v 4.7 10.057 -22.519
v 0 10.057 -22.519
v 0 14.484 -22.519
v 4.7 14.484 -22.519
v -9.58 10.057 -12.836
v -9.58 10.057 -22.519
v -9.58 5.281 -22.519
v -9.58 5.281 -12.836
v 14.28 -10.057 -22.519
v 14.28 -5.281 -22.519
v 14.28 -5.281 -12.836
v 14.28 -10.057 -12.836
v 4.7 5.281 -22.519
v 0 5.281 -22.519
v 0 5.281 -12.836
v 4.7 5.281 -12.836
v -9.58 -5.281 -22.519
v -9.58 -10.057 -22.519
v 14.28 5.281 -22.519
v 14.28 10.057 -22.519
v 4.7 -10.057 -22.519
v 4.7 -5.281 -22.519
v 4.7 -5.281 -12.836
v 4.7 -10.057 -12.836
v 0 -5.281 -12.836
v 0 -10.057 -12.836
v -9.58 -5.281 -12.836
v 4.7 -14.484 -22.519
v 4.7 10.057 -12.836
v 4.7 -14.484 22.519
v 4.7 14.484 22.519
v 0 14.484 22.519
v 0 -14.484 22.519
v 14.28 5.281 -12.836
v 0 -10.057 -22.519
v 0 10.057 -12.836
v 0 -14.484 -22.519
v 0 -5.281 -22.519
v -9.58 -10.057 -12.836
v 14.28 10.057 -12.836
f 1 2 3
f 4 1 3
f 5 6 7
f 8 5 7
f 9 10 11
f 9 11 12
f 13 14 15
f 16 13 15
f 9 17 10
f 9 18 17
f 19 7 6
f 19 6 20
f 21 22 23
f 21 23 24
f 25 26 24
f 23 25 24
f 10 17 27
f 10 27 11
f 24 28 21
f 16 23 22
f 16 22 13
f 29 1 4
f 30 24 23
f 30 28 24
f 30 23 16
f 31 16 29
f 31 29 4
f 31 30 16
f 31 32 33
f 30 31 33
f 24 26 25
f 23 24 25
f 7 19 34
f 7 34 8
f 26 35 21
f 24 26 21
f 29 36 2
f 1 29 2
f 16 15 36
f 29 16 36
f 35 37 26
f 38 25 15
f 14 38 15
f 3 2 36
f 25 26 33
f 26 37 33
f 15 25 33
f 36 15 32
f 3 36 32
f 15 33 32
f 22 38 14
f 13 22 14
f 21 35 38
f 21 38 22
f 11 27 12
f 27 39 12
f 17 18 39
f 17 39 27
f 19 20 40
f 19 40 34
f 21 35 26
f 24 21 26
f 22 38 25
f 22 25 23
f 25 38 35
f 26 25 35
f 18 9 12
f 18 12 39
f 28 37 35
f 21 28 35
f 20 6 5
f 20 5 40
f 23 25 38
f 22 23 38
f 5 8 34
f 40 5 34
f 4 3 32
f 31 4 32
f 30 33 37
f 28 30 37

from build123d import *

# Parameters (mm, degrees)
F1_DEPTH = 4.7
F3_W     = 9.5804445446
F3_H     = 4.7753988765
F3_W_2   = 4.7
F4_DEPTH = 9.6834488213
F2_W     = 4.7
F2_H     = 4.7753988765


with BuildPart() as f1:
    # F0 (on Right) → F1 (new body)
    with BuildSketch(Plane.YZ):
        Polygon((10.0567378104, -22.5192960352), (14.4835049286, -22.5192960352), (14.4835049286, 22.5192960352), (-14.4835049286, 22.5192960352), (-14.4835049286, -22.5192960352), (-10.0567378104, -22.5192960352), (-10.0567378104, -12.8358472139), (-5.2813389339, -12.8358472139), (-5.2813389339, -22.5192960352), (5.2813389339, -22.5192960352), (5.2813389339, -12.8358472139), (10.0567378104, -12.8358472139), align=None)
    extrude(amount=F1_DEPTH)


with BuildPart() as f4:
    # F3 (on face) → F4 (new body, through all)
    with BuildSketch(Plane(origin=(0, 0, -22.5192960352), x_dir=(1, 0, 0), z_dir=(0, 0, -1))):
        with Locations((9.4902222723, -7.6690383721)):
            Rectangle(F3_W, F3_H)
        with Locations((2.35, -7.6690383721)):
            Rectangle(F3_W_2, F3_H)
        with Locations((-4.7902222723, -7.6690383721)):
            Rectangle(F3_W, F3_H)
    extrude(amount=-F4_DEPTH)


with BuildPart() as f4b:
    # F3 (on face) → F4, piece 2 (new body, through all)
    with BuildSketch(Plane(origin=(0, 0, -22.5192960352), x_dir=(1, 0, 0), z_dir=(0, 0, -1))):
        Polygon((-9.5804445446, 5.2813389339), (0, 5.2813389339), (4.7, 5.2813389339), (14.2804445446, 5.2813389339), (14.2804445446, 10.0567378104), (-9.5804445446, 10.0567378104), align=None)
    extrude(amount=-F4_DEPTH)


with BuildPart() as f4c:
    # F2 (on face) → F4, piece 3 (new body, through all)
    with BuildSketch(Plane(origin=(0, 0, -22.5192960352), x_dir=(1, 0, 0), z_dir=(0, 0, -1))):
        with Locations((2.35, 7.6690383721)):
            Rectangle(F2_W, F2_H)
    extrude(amount=-F4_DEPTH)


solid = Compound([f1.part, f4.part, f4b.part, f4c.part])
